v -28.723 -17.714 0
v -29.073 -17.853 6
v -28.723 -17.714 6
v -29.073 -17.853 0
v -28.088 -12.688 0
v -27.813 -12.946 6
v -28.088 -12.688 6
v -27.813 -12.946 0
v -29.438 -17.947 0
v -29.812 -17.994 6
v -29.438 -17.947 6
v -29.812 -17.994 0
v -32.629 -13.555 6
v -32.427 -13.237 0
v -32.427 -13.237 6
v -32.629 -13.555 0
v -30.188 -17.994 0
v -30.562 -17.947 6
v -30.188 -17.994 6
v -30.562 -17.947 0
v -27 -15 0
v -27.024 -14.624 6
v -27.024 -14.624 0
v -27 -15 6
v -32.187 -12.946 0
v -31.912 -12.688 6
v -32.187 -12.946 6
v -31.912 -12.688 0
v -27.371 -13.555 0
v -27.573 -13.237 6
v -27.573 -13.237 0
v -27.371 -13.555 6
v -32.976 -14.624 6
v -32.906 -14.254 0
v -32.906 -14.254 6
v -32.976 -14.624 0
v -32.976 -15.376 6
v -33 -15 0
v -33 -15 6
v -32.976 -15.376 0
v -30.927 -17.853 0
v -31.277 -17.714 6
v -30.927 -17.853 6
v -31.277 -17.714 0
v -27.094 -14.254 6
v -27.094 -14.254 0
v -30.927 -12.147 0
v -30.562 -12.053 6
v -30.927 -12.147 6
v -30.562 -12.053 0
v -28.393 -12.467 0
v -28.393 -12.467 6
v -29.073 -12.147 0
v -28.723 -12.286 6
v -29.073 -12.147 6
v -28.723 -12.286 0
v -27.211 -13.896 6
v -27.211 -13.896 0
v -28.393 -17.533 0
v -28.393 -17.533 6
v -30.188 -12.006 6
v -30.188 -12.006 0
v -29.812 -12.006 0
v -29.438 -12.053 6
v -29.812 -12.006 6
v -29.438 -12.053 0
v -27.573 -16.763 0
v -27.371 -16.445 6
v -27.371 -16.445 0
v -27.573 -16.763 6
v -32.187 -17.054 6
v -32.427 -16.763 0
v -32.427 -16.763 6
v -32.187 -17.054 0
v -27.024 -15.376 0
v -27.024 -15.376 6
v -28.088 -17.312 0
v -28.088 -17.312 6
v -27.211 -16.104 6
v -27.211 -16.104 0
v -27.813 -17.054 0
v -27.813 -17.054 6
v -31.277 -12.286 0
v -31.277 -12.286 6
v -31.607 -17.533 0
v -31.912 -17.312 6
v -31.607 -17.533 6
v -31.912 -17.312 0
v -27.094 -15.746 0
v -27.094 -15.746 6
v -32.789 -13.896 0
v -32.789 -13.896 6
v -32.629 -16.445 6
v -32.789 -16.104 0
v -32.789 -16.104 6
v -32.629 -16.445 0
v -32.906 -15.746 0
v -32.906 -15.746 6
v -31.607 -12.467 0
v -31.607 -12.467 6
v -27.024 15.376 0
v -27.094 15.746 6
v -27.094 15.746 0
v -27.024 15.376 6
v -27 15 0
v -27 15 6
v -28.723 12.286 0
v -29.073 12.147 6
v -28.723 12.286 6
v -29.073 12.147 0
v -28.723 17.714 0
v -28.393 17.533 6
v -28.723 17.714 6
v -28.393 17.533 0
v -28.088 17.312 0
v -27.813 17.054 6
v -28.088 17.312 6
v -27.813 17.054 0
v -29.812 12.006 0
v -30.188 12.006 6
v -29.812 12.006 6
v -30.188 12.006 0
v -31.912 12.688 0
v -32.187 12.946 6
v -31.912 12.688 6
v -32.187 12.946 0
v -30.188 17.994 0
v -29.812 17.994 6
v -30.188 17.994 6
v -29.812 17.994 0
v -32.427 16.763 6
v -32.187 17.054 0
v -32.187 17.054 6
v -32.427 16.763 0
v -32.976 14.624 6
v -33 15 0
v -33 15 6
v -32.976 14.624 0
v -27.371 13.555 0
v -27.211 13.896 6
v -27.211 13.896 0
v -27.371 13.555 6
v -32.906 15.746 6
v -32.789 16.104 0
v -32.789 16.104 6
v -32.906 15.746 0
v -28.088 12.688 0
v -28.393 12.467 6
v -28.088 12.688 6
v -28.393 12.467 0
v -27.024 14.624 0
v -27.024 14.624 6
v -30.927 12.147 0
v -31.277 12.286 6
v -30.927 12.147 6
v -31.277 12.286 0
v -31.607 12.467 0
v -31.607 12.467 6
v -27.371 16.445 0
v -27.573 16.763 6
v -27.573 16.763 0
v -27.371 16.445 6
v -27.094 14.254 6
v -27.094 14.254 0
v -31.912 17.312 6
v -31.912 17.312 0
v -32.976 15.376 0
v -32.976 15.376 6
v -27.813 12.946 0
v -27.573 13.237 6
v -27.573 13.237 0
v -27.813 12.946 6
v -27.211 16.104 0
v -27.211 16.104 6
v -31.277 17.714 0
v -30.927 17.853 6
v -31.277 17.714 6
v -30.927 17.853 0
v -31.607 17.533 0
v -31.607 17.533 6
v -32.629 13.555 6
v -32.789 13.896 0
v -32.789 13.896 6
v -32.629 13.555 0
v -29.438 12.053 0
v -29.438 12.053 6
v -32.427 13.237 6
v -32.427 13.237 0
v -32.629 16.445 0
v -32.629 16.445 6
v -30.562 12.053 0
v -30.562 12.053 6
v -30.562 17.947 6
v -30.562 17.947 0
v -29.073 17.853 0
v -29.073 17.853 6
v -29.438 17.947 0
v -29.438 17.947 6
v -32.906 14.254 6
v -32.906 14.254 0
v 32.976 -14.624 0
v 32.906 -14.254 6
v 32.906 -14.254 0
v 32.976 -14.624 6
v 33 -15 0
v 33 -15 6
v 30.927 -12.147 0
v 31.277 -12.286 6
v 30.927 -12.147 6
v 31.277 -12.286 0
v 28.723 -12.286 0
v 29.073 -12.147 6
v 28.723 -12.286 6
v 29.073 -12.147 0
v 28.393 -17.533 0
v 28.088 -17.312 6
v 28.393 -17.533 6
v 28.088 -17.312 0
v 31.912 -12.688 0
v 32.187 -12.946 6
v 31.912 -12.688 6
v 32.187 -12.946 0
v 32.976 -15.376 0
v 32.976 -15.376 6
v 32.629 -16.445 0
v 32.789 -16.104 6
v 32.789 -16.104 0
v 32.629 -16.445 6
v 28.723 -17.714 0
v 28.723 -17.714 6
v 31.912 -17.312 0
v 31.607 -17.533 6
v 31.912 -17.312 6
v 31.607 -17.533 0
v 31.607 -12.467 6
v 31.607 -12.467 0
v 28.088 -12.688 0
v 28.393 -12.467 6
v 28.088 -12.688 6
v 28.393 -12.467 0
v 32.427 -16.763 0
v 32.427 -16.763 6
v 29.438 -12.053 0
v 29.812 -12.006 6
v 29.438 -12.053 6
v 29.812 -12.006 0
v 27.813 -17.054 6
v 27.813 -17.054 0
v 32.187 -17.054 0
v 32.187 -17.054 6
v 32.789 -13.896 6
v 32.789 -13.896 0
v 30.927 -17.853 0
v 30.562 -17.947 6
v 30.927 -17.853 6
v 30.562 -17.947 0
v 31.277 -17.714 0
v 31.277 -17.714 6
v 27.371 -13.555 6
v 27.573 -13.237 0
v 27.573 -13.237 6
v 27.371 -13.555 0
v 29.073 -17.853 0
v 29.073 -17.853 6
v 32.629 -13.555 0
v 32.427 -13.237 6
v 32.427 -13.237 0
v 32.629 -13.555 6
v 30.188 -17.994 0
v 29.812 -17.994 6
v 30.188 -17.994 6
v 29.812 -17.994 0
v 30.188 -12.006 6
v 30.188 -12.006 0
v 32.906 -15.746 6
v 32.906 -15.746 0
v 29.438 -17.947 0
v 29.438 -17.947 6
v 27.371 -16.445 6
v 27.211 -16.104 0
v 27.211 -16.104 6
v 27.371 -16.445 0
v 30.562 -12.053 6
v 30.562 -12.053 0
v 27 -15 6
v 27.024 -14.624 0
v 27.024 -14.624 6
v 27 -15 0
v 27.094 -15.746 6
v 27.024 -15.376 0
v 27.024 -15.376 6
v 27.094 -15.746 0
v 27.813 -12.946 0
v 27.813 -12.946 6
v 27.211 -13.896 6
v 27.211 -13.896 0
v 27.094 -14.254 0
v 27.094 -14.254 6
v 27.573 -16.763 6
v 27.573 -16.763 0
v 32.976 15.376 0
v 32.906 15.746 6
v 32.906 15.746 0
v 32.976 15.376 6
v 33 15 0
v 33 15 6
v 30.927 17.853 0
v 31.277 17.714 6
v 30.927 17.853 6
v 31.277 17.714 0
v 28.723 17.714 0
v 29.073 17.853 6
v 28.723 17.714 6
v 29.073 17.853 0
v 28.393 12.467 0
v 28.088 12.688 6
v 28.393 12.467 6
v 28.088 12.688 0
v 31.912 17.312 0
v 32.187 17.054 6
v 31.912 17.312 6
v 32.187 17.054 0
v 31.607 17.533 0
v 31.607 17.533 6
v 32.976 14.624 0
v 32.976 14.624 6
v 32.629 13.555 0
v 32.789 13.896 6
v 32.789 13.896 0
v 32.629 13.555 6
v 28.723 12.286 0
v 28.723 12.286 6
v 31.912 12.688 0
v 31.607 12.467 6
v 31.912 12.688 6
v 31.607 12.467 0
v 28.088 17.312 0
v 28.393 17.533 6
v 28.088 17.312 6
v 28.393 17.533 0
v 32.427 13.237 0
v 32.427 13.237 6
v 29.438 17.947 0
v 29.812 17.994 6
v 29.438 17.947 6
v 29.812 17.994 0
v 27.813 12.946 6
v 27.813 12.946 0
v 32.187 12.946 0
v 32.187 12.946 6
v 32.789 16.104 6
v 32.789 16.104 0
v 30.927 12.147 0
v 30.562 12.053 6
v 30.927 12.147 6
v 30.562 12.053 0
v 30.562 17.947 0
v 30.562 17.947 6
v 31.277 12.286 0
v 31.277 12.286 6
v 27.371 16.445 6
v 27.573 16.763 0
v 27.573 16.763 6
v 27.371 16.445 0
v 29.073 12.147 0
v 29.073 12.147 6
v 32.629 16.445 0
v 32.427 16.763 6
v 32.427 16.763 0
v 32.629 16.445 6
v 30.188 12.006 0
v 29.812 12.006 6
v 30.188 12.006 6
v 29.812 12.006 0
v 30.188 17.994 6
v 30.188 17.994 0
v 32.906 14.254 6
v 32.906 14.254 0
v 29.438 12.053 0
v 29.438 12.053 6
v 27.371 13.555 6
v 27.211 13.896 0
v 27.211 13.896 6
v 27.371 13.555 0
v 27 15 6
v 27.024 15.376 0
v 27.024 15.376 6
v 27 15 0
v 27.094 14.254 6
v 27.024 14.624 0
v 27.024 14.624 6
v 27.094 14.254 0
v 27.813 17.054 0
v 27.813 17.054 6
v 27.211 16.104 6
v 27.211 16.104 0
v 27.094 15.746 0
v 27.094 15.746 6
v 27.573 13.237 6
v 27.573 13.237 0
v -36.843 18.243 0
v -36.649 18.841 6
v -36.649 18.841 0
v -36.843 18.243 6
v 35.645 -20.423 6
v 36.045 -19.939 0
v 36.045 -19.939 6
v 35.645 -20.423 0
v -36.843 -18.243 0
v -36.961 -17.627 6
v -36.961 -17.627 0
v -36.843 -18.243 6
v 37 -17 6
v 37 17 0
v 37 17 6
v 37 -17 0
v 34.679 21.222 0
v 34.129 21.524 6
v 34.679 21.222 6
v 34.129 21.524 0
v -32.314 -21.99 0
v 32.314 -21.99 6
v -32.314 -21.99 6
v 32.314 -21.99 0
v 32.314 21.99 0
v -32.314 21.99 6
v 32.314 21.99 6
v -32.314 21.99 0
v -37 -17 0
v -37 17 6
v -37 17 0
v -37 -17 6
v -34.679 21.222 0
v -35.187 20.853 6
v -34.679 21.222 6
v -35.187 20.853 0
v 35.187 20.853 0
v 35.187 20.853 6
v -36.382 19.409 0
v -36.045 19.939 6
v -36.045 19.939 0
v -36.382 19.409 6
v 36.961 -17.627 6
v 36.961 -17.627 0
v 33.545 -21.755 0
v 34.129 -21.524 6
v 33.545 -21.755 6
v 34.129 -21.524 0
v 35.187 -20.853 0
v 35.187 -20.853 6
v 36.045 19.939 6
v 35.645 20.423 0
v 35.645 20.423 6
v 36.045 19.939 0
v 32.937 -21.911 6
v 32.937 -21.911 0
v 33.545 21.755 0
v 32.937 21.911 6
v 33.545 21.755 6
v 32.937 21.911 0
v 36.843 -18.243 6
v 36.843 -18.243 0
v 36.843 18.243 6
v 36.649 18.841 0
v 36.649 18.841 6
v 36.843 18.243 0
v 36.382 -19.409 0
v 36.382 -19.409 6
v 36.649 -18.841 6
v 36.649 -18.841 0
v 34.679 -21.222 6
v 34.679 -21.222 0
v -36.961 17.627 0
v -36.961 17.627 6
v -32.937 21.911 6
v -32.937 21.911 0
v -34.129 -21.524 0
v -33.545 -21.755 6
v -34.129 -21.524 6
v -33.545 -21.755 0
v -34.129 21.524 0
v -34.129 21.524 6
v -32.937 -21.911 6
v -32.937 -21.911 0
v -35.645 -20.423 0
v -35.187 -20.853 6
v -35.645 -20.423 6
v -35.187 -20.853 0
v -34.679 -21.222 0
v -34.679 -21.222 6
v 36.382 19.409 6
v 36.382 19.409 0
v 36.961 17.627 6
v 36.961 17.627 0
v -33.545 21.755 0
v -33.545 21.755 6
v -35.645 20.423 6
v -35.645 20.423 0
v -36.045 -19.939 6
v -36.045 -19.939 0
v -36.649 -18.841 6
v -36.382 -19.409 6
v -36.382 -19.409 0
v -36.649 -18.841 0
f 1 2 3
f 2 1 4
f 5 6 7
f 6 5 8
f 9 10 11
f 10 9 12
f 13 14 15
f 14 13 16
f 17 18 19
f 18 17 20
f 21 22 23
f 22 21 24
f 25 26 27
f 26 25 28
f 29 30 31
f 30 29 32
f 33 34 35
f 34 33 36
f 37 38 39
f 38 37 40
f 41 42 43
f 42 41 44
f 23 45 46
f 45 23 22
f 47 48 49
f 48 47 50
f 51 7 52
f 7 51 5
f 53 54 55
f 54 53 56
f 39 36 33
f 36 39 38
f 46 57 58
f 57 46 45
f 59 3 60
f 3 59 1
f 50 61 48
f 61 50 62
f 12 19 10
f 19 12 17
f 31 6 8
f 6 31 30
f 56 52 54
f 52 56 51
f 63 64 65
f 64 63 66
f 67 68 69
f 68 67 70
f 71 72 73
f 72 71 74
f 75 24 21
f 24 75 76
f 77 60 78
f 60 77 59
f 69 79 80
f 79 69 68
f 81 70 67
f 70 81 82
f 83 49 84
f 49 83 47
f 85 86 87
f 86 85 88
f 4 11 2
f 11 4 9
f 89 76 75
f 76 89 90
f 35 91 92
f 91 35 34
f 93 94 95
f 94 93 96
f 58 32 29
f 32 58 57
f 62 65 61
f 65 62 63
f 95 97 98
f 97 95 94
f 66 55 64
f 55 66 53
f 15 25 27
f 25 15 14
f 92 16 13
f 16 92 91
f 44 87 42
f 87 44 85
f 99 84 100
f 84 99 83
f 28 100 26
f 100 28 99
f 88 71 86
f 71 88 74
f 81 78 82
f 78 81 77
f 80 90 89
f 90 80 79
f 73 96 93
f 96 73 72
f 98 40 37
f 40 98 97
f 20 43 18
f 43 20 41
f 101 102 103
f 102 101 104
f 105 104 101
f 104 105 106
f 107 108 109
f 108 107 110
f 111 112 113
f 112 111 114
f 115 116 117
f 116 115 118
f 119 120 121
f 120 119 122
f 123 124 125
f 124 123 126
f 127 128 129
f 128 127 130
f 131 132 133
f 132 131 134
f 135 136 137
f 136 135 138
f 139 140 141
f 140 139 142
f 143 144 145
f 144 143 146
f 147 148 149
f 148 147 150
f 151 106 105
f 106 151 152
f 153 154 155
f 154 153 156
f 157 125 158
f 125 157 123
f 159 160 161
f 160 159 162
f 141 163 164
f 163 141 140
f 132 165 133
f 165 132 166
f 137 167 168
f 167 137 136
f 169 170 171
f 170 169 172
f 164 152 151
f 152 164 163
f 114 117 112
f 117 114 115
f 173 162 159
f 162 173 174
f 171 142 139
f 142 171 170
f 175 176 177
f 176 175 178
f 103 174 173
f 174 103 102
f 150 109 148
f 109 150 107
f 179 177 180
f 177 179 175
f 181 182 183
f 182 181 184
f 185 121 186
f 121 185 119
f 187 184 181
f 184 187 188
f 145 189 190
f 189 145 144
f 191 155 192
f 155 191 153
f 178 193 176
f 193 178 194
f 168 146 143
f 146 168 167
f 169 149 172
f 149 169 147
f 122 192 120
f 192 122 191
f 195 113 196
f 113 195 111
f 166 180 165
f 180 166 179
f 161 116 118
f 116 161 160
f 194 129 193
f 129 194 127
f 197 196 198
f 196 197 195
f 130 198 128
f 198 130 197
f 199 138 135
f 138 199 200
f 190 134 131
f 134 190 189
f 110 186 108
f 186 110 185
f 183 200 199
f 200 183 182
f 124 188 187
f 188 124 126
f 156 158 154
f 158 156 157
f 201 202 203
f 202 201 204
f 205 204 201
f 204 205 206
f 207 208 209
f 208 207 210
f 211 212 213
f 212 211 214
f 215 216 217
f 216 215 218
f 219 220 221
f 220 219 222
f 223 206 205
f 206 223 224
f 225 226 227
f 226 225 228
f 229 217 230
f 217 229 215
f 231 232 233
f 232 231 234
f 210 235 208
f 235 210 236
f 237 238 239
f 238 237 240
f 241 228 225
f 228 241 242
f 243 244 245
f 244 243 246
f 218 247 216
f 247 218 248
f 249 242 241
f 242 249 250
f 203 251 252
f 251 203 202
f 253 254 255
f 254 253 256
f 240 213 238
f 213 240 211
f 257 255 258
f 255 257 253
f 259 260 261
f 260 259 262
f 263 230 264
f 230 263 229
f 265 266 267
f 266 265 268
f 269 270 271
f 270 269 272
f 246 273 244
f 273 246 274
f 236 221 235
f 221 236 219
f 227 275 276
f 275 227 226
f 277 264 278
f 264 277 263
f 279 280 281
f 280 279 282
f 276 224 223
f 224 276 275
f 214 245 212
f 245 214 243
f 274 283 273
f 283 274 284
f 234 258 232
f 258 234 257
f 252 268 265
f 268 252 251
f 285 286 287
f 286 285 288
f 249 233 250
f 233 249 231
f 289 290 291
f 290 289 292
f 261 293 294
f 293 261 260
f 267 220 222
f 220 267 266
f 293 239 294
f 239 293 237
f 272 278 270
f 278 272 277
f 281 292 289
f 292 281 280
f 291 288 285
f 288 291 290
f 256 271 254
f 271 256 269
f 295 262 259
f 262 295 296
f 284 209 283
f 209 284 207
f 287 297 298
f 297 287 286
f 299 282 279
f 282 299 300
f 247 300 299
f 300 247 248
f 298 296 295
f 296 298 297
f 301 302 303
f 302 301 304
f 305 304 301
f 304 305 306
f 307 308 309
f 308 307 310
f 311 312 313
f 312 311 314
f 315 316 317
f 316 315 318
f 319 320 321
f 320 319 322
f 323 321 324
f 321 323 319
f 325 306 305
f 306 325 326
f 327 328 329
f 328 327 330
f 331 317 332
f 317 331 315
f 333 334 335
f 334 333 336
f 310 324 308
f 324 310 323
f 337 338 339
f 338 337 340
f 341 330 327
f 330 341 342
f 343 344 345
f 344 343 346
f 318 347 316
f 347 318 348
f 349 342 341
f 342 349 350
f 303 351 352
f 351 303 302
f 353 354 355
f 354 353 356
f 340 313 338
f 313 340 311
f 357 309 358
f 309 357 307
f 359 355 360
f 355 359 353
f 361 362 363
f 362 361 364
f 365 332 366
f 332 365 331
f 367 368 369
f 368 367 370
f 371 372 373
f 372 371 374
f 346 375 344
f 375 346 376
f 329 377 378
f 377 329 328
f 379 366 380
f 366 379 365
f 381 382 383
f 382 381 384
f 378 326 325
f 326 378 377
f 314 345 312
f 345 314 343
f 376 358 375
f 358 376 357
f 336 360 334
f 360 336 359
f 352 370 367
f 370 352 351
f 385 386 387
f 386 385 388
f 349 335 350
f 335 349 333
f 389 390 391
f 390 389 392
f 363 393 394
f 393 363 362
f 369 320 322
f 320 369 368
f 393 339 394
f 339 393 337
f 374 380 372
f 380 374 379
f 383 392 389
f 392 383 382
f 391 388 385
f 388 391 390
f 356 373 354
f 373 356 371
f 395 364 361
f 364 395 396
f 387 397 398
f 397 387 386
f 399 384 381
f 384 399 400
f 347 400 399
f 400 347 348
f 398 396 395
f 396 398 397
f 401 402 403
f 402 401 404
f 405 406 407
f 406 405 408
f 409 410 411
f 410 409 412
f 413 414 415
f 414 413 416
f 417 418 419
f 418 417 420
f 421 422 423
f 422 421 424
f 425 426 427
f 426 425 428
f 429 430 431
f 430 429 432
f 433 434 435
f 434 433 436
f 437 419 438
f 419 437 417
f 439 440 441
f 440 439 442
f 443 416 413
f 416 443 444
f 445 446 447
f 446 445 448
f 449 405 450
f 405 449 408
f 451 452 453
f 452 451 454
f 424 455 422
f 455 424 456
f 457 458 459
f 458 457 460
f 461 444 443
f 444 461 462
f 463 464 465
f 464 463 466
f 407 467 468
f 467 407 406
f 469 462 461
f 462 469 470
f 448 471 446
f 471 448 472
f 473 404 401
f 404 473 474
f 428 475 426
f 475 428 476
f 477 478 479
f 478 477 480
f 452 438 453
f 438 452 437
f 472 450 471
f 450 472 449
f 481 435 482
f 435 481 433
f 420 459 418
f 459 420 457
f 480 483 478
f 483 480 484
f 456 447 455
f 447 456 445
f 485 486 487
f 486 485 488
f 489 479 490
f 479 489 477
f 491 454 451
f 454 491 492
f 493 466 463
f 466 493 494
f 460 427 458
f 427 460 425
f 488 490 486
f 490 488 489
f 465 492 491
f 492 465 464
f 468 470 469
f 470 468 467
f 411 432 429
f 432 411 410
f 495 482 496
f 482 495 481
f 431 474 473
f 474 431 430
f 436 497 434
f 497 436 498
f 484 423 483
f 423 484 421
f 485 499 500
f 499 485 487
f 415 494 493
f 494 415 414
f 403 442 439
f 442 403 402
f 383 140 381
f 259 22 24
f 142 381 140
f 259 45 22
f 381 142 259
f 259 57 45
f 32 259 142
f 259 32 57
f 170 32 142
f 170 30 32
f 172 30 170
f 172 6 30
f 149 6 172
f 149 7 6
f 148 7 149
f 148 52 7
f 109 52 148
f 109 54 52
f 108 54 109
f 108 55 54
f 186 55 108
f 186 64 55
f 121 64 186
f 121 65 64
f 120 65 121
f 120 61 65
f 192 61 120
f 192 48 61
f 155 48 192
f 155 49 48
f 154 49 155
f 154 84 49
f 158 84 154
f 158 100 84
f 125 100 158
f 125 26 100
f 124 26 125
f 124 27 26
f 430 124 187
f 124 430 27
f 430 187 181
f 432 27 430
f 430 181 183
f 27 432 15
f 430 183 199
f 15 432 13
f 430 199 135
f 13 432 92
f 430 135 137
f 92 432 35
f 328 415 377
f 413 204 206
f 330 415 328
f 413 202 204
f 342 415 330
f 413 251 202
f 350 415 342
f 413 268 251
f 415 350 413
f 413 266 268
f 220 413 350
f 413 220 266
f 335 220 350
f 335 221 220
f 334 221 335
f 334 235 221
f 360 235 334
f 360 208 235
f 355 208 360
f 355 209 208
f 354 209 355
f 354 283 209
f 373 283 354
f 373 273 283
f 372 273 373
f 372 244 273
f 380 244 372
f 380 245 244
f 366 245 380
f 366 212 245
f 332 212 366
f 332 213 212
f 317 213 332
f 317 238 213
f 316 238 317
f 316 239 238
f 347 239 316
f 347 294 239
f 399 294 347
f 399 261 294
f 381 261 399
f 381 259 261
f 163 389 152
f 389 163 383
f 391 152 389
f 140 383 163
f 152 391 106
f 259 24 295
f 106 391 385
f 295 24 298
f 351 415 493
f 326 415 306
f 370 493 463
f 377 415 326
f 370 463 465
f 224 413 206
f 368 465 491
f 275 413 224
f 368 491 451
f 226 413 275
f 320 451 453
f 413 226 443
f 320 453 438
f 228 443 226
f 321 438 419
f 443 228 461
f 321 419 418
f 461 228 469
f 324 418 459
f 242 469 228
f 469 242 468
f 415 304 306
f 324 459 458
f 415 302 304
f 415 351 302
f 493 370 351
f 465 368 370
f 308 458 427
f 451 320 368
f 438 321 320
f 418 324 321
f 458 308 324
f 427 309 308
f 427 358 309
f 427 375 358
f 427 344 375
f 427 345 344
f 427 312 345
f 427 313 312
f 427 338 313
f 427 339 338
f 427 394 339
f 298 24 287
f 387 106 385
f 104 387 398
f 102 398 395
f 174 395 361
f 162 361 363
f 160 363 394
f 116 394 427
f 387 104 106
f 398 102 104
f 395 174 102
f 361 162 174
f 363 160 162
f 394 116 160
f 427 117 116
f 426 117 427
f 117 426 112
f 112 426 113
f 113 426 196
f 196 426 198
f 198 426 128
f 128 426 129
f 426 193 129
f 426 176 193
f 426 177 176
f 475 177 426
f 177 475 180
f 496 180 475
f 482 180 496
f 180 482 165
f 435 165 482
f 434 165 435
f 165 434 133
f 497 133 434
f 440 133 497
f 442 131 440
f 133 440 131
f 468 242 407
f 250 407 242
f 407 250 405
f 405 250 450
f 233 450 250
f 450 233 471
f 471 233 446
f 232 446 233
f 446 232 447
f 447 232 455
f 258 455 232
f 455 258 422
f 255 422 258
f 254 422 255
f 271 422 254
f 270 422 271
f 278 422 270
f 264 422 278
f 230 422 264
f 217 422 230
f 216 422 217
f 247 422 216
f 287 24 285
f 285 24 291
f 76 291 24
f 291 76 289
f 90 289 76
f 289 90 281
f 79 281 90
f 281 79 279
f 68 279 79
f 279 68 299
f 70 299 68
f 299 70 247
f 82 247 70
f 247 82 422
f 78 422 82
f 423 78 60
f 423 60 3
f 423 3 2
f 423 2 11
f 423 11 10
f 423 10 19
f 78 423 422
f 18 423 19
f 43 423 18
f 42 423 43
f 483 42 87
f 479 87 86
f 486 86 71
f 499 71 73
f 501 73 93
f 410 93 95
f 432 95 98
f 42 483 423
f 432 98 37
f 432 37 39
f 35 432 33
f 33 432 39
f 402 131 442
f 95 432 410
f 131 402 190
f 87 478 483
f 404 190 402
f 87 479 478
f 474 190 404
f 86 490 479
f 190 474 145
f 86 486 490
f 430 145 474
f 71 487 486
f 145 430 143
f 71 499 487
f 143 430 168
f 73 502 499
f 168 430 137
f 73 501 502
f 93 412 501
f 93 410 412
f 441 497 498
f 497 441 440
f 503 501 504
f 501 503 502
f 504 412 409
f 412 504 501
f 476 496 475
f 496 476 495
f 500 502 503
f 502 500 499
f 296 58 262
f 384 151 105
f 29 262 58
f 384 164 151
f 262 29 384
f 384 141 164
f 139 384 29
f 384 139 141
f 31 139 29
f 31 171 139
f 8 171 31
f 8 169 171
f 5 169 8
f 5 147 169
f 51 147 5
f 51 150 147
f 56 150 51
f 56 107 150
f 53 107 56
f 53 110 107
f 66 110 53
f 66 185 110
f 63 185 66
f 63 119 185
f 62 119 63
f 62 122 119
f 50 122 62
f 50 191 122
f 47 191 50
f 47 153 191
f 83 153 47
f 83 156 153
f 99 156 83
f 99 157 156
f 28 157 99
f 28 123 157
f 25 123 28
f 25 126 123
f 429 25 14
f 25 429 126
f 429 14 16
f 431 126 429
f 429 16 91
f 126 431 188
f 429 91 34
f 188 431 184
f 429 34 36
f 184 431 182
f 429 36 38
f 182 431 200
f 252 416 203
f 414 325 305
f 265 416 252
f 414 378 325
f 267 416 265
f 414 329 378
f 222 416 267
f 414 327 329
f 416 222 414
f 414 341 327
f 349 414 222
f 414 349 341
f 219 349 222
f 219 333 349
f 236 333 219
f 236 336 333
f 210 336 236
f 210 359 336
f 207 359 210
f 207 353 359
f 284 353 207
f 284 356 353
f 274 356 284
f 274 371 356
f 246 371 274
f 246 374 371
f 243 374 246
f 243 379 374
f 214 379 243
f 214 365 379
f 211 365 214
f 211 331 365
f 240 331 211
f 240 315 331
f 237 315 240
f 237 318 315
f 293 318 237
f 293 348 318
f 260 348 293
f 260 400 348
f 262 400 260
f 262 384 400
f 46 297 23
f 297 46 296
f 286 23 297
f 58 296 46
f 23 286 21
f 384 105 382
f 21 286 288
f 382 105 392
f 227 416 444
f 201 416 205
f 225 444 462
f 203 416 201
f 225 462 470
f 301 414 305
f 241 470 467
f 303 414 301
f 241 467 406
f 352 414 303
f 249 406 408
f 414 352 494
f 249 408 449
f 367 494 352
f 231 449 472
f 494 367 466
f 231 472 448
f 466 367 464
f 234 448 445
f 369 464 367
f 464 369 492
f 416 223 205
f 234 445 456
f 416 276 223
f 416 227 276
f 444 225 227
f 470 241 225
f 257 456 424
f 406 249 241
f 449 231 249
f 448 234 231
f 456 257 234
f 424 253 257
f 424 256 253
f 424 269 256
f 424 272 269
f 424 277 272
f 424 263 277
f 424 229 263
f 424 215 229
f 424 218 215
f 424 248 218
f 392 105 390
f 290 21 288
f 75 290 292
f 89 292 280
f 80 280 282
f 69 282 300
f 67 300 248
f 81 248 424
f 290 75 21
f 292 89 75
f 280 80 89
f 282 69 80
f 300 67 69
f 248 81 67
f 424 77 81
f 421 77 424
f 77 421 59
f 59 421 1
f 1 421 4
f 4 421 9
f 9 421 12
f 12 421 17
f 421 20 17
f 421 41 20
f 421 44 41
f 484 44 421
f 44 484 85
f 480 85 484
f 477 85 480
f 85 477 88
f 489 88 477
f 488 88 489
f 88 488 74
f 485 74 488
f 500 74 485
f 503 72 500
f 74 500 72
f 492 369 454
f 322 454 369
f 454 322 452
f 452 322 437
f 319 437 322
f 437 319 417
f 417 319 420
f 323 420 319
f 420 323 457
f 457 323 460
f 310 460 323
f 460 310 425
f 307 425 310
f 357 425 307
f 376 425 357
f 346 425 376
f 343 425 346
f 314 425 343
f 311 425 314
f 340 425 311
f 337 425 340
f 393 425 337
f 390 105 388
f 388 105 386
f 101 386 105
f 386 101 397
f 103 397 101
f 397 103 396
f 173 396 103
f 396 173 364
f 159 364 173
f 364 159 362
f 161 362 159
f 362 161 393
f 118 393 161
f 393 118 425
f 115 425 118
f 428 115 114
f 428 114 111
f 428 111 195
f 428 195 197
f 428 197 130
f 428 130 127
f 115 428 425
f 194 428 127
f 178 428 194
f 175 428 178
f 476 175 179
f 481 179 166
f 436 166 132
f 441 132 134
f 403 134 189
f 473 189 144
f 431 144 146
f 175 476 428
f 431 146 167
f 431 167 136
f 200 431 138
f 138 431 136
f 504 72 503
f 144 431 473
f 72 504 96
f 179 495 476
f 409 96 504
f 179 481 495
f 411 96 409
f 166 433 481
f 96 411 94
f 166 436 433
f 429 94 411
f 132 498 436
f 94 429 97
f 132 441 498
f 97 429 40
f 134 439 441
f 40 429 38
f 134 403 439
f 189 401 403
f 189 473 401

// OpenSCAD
$fn = 50;


difference() {
	union() {
		hull() {
			translate(v = [-32.0000000000, 17.0000000000, 0]) {
				cylinder(h = 6, r = 5);
			}
			translate(v = [32.0000000000, 17.0000000000, 0]) {
				cylinder(h = 6, r = 5);
			}
			translate(v = [-32.0000000000, -17.0000000000, 0]) {
				cylinder(h = 6, r = 5);
			}
			translate(v = [32.0000000000, -17.0000000000, 0]) {
				cylinder(h = 6, r = 5);
			}
		}
	}
	union() {
		translate(v = [-30.0000000000, -15.0000000000, -100.0000000000]) {
			cylinder(h = 200, r = 3.0000000000);
		}
		translate(v = [-30.0000000000, 15.0000000000, -100.0000000000]) {
			cylinder(h = 200, r = 3.0000000000);
		}
		translate(v = [30.0000000000, -15.0000000000, -100.0000000000]) {
			cylinder(h = 200, r = 3.0000000000);
		}
		translate(v = [30.0000000000, 15.0000000000, -100.0000000000]) {
			cylinder(h = 200, r = 3.0000000000);
		}
	}
}
